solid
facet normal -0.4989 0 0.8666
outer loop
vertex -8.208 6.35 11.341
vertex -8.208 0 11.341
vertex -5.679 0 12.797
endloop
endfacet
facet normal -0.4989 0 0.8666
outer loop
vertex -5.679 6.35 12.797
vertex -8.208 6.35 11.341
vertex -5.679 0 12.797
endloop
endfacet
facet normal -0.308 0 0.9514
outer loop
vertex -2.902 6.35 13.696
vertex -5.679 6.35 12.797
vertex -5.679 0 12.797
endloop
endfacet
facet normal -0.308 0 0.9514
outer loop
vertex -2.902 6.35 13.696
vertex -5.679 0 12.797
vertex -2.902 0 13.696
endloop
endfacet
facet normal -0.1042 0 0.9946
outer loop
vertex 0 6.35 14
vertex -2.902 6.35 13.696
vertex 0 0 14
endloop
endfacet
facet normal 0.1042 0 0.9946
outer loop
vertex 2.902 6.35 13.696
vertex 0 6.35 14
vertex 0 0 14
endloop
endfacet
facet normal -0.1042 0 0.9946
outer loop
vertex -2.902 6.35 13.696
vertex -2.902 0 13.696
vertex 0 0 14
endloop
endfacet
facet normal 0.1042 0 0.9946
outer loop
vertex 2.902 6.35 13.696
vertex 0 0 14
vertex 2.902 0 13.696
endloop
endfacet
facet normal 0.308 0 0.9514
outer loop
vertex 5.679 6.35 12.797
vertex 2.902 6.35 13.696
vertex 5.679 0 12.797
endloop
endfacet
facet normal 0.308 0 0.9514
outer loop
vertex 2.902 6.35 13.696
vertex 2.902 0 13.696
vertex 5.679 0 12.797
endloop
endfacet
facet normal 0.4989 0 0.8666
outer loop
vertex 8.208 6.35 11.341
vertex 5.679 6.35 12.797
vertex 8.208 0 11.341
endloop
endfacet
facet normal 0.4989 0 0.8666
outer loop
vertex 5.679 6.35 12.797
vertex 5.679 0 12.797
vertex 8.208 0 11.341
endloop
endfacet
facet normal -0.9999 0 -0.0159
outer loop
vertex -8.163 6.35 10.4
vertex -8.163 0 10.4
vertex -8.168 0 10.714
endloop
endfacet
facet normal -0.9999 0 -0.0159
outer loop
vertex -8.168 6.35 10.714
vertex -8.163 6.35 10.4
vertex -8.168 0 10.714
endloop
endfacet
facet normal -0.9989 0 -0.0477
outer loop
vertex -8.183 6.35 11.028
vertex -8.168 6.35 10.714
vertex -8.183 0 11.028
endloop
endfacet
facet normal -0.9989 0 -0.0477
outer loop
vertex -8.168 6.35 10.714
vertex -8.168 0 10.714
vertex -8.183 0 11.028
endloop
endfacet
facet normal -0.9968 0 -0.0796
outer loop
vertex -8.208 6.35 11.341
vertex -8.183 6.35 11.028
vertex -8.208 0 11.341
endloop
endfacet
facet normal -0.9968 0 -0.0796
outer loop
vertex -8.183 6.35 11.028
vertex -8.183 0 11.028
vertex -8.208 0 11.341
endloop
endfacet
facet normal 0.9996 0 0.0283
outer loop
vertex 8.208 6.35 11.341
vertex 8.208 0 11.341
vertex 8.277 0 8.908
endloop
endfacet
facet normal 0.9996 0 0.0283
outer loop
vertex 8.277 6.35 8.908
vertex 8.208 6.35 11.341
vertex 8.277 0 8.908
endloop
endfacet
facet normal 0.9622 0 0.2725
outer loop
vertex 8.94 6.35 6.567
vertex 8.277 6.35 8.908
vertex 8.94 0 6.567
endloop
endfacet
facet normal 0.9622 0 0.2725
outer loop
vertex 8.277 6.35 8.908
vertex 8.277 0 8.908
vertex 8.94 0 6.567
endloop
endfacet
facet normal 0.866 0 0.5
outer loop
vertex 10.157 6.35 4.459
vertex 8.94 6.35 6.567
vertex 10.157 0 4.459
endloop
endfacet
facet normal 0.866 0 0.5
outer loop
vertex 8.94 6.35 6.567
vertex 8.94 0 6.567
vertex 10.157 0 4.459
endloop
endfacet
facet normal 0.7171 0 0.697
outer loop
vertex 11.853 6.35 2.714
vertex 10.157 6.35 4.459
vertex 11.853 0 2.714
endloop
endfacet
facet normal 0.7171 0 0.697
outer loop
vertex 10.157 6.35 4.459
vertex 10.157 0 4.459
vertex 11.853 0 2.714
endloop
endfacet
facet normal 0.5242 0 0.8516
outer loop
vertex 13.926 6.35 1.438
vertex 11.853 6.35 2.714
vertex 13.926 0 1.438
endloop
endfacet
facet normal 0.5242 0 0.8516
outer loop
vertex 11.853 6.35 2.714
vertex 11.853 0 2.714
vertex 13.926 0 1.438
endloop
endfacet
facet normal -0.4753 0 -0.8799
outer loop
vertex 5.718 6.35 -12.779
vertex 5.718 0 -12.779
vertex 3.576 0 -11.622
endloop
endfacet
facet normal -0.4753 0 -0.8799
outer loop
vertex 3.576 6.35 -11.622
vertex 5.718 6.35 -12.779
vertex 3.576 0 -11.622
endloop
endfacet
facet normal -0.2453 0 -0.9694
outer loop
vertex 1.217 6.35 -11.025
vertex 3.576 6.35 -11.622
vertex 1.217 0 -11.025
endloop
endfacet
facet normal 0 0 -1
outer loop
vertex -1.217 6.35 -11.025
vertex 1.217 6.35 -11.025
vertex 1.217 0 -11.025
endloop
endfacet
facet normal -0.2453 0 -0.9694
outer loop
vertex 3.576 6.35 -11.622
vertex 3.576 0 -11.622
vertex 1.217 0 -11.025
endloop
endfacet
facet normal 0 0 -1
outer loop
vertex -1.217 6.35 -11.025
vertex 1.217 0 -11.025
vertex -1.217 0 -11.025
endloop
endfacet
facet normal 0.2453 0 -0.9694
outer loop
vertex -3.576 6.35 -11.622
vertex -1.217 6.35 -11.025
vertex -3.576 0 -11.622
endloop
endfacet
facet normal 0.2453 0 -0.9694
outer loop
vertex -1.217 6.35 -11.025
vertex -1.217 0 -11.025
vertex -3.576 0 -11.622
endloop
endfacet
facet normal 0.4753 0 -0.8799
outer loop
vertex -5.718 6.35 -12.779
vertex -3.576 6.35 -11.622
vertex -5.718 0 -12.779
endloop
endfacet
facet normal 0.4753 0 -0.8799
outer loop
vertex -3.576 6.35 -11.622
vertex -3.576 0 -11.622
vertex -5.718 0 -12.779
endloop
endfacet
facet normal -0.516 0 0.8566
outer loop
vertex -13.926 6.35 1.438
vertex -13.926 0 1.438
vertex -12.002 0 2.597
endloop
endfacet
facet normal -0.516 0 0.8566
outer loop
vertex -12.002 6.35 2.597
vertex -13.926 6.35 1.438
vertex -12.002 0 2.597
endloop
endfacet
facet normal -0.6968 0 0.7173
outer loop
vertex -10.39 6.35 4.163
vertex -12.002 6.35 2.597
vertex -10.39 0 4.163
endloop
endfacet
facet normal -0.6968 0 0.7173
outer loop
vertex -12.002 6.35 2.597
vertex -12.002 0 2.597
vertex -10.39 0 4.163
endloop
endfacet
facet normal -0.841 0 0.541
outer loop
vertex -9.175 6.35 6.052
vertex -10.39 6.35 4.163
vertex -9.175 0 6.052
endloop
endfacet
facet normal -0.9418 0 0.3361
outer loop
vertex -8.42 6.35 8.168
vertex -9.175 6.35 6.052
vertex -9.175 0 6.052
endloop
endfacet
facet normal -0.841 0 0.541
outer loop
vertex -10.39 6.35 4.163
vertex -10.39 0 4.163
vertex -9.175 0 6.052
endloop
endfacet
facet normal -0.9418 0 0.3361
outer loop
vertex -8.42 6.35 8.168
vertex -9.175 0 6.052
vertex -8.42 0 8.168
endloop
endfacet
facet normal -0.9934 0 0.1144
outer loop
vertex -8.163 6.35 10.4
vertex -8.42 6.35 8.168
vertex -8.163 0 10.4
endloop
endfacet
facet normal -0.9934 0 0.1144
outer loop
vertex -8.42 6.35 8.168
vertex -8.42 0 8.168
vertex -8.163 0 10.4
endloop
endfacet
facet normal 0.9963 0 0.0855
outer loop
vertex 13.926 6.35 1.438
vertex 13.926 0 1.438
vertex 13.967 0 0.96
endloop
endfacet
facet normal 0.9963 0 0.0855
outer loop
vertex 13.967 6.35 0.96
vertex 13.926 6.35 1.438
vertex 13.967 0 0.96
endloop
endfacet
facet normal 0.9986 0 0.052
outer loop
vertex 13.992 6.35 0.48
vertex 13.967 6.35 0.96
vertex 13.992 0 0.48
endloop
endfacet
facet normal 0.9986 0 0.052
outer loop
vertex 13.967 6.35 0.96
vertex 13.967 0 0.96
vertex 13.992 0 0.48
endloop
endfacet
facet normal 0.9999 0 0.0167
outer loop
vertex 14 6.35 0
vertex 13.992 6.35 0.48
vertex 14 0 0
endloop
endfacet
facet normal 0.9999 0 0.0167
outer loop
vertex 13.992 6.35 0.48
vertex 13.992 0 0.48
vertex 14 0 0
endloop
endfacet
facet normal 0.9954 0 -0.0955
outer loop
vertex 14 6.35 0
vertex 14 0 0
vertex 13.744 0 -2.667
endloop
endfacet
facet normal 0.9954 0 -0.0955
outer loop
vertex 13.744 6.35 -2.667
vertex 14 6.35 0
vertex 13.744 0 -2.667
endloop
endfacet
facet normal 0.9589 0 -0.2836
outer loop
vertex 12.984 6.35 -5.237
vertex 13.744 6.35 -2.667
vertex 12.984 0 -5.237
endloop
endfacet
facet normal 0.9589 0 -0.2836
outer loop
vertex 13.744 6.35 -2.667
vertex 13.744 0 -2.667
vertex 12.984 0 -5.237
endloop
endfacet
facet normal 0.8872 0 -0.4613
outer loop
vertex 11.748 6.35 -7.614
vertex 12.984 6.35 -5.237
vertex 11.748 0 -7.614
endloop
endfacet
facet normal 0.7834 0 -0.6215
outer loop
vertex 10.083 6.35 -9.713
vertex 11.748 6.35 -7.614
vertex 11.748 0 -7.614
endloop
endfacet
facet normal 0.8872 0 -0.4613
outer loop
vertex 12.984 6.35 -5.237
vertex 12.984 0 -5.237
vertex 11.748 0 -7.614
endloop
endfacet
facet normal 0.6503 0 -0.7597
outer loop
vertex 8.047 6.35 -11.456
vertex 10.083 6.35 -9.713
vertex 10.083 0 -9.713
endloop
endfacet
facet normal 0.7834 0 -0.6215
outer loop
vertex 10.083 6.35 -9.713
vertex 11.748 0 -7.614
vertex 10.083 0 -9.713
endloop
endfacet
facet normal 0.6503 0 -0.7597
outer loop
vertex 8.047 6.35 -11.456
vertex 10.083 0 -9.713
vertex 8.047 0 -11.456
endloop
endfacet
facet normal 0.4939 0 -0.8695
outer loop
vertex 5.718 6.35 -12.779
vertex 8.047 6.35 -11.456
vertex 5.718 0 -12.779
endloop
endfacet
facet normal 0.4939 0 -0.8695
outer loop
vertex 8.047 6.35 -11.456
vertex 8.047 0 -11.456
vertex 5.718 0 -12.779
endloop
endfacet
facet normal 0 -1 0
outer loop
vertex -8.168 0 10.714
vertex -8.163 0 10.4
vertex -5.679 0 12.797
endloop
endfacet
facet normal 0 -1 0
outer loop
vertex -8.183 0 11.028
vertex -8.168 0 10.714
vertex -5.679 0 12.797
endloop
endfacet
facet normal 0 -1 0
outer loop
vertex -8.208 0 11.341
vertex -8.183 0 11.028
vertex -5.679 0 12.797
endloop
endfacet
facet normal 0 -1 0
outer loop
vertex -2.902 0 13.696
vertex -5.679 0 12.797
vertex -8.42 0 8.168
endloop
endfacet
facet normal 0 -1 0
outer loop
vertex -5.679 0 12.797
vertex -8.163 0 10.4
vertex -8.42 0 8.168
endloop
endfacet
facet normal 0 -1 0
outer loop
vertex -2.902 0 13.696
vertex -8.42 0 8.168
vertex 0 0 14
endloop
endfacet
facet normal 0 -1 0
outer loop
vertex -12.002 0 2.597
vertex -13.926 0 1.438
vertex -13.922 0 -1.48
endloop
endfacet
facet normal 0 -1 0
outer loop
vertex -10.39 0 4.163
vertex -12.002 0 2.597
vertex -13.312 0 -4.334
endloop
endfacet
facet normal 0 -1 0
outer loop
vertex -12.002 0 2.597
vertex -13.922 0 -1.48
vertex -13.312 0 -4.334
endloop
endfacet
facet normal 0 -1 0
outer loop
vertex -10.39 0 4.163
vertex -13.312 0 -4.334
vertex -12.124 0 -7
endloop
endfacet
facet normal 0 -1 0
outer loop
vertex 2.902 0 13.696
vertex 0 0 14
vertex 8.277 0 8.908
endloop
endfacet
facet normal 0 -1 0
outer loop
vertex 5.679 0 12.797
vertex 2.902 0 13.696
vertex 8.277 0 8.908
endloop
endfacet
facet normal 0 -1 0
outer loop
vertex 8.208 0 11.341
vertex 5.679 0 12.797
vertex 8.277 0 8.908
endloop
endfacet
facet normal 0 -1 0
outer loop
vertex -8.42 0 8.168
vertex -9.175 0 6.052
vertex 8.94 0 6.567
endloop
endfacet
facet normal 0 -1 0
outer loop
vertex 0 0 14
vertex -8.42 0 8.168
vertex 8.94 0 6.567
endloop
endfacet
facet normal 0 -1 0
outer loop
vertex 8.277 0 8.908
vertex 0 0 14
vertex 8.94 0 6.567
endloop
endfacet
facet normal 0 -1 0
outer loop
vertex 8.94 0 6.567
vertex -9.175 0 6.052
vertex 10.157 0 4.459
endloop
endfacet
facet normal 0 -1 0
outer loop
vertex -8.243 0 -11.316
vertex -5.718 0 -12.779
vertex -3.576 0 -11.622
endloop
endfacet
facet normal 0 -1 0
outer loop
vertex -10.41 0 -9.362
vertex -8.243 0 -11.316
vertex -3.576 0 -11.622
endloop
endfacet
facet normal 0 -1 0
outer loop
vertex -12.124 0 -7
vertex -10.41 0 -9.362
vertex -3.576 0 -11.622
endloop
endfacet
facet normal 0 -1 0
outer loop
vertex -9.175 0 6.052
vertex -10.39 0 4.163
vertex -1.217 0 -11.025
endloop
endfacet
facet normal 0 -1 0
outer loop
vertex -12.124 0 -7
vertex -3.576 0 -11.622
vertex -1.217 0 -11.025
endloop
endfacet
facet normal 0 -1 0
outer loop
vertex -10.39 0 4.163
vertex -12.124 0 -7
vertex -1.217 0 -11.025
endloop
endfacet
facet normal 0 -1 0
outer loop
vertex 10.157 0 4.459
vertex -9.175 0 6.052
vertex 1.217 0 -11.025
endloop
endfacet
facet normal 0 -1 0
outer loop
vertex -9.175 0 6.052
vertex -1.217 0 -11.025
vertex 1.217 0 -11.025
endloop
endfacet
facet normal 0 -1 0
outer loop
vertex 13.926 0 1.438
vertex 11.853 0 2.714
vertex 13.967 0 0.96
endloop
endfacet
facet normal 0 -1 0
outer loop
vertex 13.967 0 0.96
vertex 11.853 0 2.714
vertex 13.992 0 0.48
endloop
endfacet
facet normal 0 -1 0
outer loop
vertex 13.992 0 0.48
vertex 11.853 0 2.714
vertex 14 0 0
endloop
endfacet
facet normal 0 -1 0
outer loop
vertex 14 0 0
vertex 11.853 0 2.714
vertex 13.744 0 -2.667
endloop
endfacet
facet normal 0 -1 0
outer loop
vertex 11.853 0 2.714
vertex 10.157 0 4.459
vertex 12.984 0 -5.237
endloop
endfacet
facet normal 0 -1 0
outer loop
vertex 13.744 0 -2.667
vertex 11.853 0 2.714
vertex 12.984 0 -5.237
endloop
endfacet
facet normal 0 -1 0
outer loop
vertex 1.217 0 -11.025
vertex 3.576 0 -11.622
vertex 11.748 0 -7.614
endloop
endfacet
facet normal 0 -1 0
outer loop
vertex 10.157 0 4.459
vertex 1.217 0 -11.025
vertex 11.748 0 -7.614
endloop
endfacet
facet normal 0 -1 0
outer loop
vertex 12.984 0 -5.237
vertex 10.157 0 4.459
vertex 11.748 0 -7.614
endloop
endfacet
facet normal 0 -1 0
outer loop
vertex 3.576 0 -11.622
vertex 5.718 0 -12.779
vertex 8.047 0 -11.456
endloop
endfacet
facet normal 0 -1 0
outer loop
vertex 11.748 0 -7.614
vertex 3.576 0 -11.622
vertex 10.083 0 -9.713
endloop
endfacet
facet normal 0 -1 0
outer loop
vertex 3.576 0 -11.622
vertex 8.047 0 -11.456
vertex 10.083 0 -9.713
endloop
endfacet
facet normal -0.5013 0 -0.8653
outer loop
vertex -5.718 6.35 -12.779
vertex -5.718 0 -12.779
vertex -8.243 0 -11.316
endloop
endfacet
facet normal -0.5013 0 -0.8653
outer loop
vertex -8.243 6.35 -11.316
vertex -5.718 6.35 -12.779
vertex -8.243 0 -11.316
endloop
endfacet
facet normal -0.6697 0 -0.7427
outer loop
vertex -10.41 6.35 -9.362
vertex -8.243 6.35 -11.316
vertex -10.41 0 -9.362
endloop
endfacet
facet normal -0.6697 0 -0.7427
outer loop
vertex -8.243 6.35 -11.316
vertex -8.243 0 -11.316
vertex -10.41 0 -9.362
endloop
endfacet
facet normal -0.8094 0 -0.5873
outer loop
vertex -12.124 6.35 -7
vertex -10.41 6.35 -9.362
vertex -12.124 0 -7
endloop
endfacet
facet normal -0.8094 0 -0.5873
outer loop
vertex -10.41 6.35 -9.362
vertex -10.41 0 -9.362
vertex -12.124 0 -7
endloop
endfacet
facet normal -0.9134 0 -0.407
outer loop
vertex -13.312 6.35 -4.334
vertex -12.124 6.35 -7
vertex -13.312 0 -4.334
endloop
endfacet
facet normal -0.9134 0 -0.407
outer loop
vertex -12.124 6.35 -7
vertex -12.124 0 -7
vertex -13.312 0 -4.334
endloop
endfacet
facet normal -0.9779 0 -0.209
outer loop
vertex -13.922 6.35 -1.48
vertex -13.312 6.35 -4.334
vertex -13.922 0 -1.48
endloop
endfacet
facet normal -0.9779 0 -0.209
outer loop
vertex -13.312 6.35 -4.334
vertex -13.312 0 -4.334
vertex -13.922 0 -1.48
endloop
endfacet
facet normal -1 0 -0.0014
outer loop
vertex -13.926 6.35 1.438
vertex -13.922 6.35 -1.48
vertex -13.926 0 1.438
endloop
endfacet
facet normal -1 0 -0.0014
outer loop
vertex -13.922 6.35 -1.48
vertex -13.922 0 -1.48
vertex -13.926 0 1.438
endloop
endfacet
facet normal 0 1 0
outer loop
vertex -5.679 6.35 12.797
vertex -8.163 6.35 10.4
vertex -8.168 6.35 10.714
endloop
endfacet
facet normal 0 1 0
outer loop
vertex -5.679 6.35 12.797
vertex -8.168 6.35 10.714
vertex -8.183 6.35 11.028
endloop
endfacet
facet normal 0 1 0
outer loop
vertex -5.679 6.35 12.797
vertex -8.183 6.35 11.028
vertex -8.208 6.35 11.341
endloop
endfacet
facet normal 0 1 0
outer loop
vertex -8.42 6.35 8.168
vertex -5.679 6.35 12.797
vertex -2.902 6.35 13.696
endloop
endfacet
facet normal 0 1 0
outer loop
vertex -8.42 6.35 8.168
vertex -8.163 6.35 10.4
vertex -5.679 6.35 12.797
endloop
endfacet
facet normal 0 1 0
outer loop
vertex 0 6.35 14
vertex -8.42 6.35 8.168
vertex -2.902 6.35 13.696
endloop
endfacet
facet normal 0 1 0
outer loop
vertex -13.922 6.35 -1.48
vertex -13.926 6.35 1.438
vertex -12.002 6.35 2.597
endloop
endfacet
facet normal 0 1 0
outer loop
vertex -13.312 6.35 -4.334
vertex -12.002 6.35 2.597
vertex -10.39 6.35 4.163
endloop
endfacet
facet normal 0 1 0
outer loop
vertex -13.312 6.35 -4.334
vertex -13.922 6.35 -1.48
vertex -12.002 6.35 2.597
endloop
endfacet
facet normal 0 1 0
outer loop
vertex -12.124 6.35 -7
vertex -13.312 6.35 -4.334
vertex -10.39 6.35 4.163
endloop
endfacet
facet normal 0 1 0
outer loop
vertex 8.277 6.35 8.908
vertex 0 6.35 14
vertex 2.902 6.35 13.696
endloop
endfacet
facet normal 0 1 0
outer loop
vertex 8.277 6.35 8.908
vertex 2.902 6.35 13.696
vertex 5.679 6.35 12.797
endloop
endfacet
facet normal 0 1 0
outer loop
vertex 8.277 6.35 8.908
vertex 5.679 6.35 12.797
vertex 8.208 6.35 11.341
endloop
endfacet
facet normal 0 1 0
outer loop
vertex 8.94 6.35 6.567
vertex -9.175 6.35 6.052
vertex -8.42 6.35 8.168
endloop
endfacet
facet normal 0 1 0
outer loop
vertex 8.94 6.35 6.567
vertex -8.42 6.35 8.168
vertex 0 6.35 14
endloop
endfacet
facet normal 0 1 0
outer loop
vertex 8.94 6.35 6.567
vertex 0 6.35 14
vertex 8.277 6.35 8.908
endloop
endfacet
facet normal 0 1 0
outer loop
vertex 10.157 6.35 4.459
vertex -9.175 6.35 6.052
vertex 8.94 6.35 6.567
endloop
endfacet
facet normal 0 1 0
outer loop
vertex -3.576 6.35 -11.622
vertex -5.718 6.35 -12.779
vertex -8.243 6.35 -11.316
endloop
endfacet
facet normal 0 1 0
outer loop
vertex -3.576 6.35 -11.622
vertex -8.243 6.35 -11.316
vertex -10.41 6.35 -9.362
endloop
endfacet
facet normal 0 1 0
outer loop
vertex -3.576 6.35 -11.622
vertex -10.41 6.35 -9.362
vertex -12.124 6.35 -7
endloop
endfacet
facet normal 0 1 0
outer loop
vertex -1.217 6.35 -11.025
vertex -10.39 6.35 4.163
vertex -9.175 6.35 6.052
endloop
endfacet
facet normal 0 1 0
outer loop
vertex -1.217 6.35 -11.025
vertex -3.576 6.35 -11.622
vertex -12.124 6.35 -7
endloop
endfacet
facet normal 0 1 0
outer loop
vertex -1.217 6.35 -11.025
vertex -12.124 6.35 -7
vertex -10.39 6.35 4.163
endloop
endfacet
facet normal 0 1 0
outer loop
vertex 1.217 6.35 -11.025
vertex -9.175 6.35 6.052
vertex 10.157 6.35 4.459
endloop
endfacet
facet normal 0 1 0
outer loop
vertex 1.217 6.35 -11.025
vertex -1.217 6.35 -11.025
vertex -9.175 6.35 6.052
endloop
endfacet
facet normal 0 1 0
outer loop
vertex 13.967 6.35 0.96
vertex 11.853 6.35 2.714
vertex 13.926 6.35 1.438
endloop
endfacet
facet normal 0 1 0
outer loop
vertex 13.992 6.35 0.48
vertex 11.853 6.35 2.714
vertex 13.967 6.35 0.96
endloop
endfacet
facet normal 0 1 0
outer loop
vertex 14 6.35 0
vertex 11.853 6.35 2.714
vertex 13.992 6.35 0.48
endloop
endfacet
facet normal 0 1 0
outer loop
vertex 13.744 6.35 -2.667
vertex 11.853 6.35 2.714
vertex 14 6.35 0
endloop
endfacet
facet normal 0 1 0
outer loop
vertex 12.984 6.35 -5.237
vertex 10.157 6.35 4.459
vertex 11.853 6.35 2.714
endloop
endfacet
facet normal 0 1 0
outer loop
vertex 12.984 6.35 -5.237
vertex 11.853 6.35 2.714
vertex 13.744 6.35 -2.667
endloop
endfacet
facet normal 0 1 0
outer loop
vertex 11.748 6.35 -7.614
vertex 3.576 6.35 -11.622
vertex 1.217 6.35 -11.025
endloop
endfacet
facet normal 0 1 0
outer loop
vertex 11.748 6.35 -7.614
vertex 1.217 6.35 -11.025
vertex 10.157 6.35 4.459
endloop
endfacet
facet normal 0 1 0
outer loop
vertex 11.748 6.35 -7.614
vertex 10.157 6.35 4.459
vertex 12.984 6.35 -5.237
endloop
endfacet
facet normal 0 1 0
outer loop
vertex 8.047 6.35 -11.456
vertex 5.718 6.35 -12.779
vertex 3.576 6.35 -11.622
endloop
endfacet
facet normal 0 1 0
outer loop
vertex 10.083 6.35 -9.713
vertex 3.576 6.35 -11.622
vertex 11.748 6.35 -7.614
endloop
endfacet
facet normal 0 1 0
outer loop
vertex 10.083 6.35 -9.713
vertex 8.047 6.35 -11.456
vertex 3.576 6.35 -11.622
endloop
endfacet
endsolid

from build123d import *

# Parameters (mm, degrees)
BOSS_EXTRUDE1_DEPTH = 6.35


with BuildPart() as part:
    # Sketch1 → Boss-Extrude1 (new body)
    with BuildSketch(Plane(origin=(0, 0, 0), x_dir=(1, 0, 0), z_dir=(0, 1, 0))):
        with BuildLine():
            ThreePointArc((13.925943024, -1.438092792), (13.981473498, -0.719999187), (14, 0))
            ThreePointArc((14, 0), (11.748311638, 7.614274335), (5.717546621, 12.779266827))
            ThreePointArc((5.717546621, 12.779266827), (0, 10.95), (-5.717546621, 12.779266827))
            ThreePointArc((-5.717546621, 12.779266827), (-12.124355653, 7), (-13.925943024, -1.438092792))
            ThreePointArc((-13.925943024, -1.438092792), (-9.728304381, -5.072629445), (-8.163328399, -10.4))
            ThreePointArc((-8.163328399, -10.4), (-8.174601851, -10.871126227), (-8.208396403, -11.341174035))
            ThreePointArc((-8.208396403, -11.341174035), (0, -14), (8.208396403, -11.341174035))
            ThreePointArc((8.208396403, -11.341174035), (9.482978171, -5.475), (13.925943024, -1.438092792))
        make_face()
    extrude(amount=BOSS_EXTRUDE1_DEPTH)


solid = part.part
